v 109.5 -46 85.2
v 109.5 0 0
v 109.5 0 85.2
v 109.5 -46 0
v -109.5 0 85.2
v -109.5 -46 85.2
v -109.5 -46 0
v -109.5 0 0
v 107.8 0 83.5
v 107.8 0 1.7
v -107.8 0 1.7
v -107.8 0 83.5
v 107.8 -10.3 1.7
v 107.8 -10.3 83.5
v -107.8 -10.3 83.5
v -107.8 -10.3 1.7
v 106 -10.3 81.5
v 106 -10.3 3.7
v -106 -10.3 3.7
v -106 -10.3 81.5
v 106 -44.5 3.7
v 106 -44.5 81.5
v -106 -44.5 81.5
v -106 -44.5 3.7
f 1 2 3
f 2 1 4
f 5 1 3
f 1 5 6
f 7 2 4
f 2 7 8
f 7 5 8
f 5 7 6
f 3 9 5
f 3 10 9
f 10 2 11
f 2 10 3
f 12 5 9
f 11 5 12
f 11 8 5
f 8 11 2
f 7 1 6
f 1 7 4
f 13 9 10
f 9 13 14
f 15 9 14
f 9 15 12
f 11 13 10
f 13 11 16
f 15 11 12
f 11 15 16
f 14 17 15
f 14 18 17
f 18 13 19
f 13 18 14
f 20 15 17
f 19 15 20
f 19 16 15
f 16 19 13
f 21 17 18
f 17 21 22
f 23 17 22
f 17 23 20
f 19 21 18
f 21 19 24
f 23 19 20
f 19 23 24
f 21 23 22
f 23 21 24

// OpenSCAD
total_ht = 30.5+21.5+26+3.2+4;
echo(total_ht);

top();
// bottom();

module bottom() {
   difference() {
      union() {
         translate([-219/2,0,0]) cube([219,48+6,total_ht]);
         translate([-219/2+2,-10,2]) cube([219-4,48,total_ht-4]);
      }
      hex_piles();
   
      translate([-220/4,105/2+3,-1]) cylinder($fn=80,h=90,r=22);
      translate([220/4,105/2+3,-1]) cylinder($fn=80,h=90,r=22);
   }
}


module top() {
   difference() {
      // translate([-219/2,-46,0]) cube([219,46,total_ht]);
      translate([-219/2,-46,0]) cube([219,46,total_ht]);

      translate([-219/2+1.7,-10.3,1.7]) cube([219-3.4,48,total_ht-3.4]);
      translate([-219/2+1.7+1.8,-44.5,1.7+2]) cube([219-3.4-3.6,48,total_ht-3.4-4]);
      // hex_piles();
   }
}

module hex_piles() {
   translate([-107/2,1,4.5]) {
      hex_pile(ht=45.6);
      translate([0,0,47.5]) hex_pile(ht=18.4);
      translate([0,0,47.5+20.6]) overflow_pile(ht=8);

      translate([106+1,0,0]) hex_pile(ht=28.6);
      translate([106+1,0,30.6]) hex_pile(ht=18.4);
      translate([106+1,0,30.6+20.6]) card_pile(ht=25);
   }
}

// hex_piles();


module hex_pile(ht=10)
{
   cylinder($fn=6,h=ht,d=105);
   translate([-105/2,-91/2+0.02,0]) cube([105,91/2,ht]);
}

module card_pile(ht=24)
{
   translate([-67.5/2,-91/2,0]) cube([67.5,91,ht], center=false);
}

module overflow_pile(ht=2)
{
   translate([-89/2,-91/2,0]) cube([89,89,ht]);
}
